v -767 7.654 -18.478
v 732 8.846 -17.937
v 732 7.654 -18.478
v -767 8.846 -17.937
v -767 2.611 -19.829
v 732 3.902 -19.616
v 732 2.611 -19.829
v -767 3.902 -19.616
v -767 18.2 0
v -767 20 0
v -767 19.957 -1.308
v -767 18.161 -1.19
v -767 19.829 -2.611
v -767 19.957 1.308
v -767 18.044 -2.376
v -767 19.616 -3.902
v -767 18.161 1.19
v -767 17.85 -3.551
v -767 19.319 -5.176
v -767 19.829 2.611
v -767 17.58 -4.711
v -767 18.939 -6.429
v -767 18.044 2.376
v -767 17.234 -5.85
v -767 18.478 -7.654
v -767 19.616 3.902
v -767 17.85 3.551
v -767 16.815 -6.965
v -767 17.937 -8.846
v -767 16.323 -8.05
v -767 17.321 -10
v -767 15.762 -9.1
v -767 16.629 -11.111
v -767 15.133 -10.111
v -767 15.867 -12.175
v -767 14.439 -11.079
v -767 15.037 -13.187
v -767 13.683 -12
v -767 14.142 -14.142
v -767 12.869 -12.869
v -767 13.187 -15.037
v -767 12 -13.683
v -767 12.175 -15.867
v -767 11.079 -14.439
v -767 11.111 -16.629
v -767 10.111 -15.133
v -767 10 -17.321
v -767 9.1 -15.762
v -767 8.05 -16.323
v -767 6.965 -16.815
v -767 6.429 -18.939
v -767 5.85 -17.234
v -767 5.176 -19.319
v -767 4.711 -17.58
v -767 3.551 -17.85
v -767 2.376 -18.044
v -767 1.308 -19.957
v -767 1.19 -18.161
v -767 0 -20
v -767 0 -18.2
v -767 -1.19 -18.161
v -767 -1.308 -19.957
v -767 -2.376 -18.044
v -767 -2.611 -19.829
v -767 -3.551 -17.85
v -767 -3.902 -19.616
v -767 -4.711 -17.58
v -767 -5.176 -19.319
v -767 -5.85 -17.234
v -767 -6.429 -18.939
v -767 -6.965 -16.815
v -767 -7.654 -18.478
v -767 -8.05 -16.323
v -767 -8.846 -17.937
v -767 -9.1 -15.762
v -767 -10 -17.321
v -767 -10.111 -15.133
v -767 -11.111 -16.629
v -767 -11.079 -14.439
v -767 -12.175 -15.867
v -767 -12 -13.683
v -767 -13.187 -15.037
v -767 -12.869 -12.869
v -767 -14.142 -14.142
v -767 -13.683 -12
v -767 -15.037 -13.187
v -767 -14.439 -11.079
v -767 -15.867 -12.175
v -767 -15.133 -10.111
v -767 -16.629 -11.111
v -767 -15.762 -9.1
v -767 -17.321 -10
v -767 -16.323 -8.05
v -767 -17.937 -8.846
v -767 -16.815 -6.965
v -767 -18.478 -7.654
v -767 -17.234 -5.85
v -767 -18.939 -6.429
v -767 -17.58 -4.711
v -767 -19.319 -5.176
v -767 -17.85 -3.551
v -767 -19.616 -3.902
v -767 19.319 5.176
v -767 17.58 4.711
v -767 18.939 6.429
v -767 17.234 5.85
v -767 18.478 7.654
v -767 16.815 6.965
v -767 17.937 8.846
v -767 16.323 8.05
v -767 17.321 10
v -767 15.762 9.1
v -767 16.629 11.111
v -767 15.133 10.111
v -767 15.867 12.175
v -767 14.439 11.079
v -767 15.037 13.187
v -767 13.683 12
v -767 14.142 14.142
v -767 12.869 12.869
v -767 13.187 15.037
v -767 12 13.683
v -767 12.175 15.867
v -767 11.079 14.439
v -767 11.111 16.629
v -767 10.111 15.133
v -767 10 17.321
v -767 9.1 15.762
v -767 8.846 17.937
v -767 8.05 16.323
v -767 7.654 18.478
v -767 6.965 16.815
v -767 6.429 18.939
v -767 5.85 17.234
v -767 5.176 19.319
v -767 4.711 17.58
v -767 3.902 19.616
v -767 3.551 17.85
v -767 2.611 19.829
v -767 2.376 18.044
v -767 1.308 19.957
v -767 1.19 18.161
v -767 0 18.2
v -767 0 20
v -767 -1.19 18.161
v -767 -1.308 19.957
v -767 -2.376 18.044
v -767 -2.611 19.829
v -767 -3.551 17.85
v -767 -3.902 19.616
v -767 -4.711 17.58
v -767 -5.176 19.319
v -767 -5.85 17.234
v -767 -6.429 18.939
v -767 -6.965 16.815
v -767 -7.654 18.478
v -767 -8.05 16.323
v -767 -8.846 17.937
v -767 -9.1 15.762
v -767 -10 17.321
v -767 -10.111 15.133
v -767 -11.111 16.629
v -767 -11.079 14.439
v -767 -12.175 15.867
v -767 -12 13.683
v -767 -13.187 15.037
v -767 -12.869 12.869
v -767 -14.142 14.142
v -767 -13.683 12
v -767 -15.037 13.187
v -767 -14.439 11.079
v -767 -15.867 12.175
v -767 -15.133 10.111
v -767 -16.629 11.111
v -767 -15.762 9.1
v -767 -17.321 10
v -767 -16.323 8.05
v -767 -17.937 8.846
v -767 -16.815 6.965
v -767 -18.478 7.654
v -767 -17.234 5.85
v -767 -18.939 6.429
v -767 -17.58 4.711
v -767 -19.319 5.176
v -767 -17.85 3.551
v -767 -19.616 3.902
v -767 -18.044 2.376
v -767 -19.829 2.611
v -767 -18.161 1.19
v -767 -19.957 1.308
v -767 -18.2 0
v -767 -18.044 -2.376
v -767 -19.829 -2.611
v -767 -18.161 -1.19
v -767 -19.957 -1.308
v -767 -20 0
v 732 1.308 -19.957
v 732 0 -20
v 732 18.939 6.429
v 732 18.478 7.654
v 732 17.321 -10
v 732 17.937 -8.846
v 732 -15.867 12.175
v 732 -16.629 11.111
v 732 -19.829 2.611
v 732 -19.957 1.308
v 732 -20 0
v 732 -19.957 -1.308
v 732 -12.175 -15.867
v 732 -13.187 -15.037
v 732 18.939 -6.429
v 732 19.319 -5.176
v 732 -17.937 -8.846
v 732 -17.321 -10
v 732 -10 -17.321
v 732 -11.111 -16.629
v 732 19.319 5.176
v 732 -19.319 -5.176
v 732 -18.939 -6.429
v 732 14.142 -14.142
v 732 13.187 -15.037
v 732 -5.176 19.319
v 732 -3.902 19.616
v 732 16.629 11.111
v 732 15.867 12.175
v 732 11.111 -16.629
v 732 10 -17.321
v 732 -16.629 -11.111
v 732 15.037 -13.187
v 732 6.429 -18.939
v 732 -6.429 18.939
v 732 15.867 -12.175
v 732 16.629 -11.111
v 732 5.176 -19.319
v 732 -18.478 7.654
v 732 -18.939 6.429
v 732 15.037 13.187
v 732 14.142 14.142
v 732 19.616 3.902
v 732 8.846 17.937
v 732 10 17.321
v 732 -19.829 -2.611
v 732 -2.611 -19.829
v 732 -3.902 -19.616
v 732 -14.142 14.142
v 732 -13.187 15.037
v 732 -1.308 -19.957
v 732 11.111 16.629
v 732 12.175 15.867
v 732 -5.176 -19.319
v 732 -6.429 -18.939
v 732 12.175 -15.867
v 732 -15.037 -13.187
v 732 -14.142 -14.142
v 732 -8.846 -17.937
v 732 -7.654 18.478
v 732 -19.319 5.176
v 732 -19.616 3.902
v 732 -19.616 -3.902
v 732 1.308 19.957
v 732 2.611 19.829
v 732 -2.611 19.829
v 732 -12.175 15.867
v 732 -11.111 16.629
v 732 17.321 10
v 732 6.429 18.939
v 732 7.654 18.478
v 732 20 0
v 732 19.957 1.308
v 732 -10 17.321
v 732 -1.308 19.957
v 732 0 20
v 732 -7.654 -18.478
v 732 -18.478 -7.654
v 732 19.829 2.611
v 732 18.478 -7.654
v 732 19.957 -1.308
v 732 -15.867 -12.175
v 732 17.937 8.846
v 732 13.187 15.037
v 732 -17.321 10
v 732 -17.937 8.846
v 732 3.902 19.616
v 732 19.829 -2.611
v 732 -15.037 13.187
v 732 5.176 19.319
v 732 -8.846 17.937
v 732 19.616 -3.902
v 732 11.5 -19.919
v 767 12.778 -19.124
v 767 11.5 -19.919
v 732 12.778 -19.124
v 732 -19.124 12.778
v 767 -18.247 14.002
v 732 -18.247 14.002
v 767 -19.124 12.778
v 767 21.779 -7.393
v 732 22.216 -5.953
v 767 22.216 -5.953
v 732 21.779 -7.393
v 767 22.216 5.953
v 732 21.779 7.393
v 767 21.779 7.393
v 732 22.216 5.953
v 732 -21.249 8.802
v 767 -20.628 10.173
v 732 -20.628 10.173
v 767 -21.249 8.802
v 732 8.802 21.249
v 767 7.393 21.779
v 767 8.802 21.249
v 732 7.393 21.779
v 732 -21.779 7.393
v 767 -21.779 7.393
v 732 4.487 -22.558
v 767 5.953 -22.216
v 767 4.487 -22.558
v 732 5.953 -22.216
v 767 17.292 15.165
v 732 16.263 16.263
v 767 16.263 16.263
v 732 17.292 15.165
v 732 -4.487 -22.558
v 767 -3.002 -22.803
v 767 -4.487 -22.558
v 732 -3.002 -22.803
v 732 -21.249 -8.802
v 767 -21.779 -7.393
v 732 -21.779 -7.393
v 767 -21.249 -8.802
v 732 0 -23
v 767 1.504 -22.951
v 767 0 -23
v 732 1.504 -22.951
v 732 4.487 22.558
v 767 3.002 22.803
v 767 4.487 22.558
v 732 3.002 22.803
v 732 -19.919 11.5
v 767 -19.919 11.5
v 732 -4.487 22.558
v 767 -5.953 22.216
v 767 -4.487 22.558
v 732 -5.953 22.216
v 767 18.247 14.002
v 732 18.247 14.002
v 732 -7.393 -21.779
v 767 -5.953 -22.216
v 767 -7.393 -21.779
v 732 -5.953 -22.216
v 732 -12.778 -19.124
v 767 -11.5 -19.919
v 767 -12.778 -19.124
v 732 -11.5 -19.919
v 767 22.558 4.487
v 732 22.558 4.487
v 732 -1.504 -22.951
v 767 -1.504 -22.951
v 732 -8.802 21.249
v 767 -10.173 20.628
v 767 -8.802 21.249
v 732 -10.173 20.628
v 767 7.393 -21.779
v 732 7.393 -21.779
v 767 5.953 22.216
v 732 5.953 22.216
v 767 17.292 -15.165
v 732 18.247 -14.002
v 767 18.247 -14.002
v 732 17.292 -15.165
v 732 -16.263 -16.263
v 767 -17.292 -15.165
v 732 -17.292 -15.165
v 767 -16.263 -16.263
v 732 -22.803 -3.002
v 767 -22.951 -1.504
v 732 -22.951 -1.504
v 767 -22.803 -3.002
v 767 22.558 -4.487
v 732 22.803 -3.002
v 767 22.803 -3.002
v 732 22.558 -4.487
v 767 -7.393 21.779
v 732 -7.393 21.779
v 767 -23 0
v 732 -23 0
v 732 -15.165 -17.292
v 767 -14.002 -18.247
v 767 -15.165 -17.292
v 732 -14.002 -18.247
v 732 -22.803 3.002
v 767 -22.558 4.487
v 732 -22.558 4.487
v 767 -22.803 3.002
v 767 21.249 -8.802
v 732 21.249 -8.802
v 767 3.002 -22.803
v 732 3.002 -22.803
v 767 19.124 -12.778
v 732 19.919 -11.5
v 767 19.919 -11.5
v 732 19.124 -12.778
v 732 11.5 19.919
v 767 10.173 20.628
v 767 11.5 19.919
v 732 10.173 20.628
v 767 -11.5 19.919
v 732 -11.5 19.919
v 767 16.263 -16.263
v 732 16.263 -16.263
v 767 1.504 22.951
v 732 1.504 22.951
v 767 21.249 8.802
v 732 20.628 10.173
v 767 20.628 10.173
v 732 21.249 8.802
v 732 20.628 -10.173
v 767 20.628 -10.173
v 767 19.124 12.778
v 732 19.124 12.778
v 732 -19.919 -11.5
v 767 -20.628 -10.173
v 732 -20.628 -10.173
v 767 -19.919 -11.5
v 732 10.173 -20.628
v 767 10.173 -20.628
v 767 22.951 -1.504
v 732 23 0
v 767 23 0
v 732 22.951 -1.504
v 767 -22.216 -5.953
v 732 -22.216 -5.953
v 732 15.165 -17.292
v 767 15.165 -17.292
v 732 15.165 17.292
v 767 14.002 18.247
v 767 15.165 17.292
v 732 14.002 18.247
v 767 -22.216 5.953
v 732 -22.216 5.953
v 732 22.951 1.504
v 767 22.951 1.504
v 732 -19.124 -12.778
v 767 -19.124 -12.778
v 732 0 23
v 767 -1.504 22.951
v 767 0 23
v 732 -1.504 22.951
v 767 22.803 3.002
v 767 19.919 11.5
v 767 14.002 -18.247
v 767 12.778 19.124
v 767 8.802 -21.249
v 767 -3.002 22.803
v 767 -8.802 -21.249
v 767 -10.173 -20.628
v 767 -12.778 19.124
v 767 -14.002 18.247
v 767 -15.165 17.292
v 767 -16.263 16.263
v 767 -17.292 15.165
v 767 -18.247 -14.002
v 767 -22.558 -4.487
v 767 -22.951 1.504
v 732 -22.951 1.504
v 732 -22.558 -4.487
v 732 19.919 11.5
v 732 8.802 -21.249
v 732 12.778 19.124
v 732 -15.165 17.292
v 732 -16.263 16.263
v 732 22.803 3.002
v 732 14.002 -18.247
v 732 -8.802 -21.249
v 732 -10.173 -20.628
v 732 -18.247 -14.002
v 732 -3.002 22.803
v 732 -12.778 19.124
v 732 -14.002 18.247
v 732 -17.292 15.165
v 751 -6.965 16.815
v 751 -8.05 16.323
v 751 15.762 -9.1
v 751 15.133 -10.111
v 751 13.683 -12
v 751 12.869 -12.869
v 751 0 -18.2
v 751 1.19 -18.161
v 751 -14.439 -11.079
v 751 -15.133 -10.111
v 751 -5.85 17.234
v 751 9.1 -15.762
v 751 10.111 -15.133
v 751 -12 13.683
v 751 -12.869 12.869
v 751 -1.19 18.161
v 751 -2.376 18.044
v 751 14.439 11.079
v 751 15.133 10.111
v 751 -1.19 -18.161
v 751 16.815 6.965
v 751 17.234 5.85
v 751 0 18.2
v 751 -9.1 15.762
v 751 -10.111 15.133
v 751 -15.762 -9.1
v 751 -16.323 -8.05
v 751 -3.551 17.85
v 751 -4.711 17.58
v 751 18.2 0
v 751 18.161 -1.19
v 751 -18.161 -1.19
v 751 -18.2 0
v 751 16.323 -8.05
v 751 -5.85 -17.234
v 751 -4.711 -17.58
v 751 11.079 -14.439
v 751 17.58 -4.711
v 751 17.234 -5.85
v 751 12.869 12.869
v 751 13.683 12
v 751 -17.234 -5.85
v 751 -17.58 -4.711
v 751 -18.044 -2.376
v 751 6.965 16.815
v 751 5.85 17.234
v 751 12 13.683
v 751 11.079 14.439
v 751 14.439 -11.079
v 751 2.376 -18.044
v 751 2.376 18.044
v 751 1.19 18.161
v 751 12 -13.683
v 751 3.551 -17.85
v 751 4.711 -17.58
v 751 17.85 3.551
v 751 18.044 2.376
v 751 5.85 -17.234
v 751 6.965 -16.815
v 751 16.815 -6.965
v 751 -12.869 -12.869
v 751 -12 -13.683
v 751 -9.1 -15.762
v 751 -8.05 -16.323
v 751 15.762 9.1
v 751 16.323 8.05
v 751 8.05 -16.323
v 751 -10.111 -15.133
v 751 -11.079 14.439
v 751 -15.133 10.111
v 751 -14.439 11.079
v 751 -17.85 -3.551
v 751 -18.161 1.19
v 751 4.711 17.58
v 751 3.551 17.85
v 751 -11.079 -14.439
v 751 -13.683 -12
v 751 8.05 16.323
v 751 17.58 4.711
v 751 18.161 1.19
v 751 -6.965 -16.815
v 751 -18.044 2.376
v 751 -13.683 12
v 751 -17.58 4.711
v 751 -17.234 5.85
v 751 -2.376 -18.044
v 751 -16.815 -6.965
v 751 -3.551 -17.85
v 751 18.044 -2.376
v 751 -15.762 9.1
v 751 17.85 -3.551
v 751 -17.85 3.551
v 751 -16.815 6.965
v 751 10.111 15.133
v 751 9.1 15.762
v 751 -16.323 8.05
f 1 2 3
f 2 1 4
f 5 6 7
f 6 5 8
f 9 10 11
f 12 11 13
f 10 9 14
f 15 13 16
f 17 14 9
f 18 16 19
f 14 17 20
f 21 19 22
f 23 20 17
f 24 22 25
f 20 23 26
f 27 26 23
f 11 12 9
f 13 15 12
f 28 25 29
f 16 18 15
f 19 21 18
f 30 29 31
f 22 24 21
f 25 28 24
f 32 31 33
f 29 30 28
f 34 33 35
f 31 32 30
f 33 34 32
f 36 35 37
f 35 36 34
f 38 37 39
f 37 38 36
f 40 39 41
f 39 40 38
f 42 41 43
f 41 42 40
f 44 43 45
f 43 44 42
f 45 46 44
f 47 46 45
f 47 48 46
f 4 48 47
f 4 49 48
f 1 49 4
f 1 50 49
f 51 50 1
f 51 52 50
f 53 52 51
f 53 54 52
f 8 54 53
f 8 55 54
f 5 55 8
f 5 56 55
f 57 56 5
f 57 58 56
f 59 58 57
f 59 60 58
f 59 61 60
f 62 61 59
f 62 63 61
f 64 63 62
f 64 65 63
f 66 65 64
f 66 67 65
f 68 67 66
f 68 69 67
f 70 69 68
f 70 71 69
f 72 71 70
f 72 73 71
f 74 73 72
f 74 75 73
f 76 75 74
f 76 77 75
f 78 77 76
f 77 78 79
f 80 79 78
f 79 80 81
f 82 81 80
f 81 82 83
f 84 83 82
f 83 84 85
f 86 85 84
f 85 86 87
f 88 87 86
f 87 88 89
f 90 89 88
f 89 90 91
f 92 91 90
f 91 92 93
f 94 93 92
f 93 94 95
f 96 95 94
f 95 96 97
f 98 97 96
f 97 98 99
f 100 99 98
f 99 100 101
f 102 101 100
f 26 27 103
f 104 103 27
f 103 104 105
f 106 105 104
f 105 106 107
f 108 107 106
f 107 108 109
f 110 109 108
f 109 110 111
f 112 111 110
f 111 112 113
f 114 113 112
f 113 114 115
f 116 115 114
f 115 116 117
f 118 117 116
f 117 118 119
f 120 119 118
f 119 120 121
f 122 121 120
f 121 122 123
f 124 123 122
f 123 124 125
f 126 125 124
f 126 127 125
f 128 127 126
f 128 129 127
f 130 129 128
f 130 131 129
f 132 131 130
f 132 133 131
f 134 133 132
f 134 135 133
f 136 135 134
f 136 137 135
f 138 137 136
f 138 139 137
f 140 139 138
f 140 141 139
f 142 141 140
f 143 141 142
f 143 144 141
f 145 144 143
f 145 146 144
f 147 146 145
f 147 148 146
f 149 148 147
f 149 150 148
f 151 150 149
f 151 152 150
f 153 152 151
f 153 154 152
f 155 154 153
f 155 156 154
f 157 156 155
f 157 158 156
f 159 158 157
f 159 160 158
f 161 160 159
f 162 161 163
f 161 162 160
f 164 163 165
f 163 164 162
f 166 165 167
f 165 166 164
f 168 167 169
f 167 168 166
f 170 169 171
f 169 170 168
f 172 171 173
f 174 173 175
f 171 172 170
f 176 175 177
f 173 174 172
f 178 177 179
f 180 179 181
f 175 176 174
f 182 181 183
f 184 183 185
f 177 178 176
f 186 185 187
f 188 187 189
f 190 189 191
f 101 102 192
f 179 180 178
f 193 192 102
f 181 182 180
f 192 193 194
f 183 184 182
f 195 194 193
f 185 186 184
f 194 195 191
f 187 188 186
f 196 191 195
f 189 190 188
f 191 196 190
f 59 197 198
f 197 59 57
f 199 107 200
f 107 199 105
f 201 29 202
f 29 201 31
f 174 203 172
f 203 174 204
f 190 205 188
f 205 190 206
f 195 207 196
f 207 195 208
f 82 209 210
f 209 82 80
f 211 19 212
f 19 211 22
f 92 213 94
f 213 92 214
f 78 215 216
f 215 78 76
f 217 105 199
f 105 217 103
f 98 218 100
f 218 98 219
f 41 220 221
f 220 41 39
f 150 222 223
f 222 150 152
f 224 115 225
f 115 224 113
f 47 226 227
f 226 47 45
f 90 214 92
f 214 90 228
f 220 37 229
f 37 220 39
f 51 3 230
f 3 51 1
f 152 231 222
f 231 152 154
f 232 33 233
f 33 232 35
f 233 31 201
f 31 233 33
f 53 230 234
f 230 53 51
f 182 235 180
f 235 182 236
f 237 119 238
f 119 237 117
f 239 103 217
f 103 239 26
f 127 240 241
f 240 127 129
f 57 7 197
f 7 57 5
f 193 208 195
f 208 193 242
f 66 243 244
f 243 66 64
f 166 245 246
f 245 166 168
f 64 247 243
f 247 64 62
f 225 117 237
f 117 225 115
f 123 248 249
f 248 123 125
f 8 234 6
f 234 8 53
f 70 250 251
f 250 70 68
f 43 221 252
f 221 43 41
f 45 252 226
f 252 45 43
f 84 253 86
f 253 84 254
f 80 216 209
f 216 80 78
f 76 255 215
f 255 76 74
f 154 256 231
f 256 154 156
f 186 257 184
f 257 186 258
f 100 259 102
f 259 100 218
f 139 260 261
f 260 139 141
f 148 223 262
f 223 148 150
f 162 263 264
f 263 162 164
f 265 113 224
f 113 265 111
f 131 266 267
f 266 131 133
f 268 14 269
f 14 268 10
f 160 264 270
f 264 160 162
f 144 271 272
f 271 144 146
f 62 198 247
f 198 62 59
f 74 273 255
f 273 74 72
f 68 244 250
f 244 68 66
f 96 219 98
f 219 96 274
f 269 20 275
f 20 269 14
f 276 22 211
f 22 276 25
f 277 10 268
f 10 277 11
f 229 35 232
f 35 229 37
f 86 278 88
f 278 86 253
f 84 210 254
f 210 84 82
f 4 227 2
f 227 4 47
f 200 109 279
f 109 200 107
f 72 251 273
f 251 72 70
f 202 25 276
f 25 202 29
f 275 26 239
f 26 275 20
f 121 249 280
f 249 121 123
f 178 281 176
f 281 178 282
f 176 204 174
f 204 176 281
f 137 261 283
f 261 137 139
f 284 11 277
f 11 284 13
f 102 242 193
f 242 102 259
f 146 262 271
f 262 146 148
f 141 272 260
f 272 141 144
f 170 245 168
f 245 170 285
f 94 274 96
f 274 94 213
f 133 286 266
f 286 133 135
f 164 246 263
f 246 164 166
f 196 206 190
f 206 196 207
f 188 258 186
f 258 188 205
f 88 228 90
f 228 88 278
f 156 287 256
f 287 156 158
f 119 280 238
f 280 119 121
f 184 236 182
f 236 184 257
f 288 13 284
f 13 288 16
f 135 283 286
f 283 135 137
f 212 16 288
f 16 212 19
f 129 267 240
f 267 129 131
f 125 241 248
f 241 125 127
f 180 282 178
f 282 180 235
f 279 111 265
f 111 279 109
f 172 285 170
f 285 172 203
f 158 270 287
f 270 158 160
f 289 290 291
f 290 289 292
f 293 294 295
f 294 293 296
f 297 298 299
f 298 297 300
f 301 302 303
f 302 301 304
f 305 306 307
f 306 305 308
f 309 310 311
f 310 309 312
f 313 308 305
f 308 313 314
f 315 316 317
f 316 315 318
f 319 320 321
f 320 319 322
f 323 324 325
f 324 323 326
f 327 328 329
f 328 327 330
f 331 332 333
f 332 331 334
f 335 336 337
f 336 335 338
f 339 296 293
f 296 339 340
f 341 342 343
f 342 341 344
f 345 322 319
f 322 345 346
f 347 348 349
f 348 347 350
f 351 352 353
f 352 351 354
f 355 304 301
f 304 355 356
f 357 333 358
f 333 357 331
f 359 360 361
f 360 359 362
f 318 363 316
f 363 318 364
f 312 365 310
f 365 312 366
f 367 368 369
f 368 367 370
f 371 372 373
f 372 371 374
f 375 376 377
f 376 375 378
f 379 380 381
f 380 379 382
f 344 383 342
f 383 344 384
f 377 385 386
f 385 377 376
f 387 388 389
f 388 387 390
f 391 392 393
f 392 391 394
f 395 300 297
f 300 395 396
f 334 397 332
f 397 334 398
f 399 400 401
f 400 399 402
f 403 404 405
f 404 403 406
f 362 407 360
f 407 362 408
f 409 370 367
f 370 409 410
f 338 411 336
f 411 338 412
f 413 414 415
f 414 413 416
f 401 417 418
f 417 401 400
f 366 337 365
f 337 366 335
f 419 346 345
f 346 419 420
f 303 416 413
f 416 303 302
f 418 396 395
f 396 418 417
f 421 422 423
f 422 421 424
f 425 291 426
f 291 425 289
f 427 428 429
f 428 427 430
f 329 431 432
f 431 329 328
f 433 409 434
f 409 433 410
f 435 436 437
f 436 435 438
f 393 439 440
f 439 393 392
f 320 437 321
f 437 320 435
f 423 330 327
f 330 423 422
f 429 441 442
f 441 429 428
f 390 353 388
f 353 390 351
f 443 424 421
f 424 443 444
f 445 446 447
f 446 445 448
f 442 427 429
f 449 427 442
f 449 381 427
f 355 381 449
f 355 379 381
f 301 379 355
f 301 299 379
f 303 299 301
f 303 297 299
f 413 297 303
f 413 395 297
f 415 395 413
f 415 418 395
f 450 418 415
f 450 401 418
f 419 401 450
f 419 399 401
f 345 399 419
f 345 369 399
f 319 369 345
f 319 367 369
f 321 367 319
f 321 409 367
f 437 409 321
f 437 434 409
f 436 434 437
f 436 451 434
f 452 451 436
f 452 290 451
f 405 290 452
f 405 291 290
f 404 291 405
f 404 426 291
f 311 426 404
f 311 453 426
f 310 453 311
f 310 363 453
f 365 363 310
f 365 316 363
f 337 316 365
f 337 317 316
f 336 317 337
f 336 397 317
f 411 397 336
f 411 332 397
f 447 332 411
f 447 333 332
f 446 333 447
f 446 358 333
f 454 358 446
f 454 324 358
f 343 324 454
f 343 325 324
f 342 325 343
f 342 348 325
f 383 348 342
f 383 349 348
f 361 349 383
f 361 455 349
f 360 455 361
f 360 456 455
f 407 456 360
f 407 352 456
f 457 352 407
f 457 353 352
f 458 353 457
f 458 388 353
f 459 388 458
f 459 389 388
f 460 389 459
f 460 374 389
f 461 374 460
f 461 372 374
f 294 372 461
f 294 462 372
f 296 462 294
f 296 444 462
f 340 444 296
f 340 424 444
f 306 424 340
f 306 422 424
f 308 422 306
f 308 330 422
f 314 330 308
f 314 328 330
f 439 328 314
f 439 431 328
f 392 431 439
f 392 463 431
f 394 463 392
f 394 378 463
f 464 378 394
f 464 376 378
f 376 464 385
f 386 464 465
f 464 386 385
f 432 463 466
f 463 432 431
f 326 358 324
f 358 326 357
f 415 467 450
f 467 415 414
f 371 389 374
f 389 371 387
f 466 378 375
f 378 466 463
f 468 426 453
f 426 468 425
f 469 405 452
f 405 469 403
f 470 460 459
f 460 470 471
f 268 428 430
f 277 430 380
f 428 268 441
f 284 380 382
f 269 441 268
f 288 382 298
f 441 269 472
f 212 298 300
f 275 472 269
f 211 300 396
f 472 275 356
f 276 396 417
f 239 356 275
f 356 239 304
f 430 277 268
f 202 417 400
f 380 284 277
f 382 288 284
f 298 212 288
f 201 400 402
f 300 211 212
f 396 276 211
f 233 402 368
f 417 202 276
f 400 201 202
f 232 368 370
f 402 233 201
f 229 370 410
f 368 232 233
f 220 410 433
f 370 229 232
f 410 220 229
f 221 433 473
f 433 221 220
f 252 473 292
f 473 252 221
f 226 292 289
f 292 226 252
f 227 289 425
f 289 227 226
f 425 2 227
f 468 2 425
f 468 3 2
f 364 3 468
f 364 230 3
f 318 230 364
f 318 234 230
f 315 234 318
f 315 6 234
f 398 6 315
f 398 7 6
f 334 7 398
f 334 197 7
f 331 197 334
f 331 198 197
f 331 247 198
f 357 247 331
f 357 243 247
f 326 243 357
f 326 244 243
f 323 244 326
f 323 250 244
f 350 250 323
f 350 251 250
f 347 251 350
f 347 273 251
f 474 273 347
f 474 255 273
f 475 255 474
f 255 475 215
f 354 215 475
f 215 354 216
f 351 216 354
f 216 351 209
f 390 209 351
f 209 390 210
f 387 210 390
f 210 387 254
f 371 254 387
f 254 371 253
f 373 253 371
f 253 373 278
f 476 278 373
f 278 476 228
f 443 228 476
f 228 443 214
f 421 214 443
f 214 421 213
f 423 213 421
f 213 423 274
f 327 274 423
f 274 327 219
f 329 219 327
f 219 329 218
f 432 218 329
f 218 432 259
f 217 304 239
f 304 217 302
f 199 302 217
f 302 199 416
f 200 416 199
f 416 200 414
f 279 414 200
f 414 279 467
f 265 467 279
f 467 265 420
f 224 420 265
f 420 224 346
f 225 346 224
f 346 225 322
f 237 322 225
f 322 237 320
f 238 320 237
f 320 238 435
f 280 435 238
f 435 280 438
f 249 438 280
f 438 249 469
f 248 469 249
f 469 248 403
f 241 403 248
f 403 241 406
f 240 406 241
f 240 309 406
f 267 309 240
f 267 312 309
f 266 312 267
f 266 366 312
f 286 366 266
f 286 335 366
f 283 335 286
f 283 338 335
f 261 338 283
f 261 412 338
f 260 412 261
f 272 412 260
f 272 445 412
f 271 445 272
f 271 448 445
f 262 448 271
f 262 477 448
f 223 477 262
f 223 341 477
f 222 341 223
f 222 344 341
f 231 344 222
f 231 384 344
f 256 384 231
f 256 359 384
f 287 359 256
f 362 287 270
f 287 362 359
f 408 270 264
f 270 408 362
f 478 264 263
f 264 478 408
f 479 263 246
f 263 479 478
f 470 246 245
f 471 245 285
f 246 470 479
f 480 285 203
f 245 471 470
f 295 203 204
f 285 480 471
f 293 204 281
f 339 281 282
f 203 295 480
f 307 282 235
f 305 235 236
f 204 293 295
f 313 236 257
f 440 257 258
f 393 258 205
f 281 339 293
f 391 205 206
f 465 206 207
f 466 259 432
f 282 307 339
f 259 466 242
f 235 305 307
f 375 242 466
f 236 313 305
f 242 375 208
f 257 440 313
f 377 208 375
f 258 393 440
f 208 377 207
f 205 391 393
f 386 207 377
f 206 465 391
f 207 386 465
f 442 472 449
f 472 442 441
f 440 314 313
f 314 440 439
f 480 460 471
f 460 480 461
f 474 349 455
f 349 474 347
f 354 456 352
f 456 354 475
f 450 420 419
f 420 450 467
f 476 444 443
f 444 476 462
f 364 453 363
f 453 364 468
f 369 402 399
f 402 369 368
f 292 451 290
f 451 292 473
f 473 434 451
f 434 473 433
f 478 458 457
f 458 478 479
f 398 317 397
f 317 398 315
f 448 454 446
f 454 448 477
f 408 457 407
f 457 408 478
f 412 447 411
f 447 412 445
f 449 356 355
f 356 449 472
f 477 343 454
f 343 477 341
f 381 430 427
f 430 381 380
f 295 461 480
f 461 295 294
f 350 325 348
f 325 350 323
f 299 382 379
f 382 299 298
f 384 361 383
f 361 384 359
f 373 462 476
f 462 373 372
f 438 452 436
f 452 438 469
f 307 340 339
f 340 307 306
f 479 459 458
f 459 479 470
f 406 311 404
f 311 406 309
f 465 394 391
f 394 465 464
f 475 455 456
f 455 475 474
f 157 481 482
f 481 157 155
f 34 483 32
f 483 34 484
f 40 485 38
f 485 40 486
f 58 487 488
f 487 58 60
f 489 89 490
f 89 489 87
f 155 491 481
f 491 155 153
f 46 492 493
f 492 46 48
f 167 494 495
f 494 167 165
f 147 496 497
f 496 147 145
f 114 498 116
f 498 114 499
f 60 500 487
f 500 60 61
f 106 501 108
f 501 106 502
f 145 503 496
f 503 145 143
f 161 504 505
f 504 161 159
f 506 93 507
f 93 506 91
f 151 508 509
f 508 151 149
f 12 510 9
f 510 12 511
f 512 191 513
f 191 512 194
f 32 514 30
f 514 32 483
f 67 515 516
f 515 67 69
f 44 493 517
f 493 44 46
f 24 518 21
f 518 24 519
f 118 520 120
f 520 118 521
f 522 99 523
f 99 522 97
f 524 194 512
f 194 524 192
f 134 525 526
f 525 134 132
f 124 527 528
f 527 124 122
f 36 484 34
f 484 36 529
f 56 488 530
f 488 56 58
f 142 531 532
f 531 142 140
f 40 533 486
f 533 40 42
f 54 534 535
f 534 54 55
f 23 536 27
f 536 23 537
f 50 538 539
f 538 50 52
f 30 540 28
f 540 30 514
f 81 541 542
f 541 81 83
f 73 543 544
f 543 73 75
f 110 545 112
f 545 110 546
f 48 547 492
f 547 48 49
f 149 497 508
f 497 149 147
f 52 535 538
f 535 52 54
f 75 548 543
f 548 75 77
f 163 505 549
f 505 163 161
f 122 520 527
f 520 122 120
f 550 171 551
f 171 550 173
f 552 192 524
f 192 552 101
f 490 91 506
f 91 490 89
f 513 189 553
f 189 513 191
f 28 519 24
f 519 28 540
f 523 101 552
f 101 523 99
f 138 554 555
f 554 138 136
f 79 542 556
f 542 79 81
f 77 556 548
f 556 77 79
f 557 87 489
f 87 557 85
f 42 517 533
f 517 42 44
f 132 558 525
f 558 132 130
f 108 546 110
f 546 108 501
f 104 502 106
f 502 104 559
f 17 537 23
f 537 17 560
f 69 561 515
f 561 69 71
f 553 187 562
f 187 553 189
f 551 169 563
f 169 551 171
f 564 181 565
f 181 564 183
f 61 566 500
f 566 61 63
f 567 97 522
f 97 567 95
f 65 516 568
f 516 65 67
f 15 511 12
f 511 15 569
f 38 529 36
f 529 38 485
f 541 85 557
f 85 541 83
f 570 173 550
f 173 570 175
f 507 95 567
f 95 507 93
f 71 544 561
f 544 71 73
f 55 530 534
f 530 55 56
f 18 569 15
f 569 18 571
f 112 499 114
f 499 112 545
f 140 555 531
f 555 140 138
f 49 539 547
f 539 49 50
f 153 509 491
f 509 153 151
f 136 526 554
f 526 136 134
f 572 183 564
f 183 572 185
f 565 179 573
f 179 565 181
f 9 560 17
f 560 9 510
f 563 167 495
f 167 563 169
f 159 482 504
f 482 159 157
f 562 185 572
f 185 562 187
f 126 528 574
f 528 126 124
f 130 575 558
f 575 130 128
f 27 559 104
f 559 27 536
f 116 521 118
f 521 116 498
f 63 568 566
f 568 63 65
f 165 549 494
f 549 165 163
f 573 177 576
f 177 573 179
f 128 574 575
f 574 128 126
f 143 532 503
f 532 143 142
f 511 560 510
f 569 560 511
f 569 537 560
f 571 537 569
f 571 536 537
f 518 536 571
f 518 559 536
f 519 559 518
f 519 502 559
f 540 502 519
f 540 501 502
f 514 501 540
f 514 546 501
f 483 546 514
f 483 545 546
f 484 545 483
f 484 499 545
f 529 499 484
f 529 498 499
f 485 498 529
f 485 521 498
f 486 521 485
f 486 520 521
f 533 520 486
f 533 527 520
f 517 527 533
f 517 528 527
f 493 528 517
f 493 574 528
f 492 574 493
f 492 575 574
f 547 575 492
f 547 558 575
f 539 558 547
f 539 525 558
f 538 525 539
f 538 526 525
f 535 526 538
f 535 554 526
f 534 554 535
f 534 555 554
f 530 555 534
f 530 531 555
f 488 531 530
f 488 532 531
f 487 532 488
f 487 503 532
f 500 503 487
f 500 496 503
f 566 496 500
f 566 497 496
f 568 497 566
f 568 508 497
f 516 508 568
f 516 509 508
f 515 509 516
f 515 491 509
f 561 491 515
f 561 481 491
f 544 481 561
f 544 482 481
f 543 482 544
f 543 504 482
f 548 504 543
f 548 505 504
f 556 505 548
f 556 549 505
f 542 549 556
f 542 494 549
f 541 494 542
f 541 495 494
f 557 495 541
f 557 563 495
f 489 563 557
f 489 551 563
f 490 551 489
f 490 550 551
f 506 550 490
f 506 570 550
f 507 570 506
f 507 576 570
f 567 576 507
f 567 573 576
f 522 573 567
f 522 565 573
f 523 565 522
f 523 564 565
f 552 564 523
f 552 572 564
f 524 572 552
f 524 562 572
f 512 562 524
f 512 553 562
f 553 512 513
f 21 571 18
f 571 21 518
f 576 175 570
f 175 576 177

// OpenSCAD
// Parameters
length_mm = 1500; //[750:3000:10]
ht40_outer_diameter = 40; //[30:80:1]
ht40_wall_thickness = 1.8; //[1:4:0.1]
end_fitting_length = 35; //[15:80:1]
end_fitting_radial_add = 3; //[1:10:0.5]
overlap_mm = 1; //[0.5:2:0.1]

$fn = 96;

// HT Pipe Segment - oriented along X so orthographic front/back/left/right show full length
module ht_pipe() {
    outer_r = ht40_outer_diameter/2;
    inner_r = outer_r - ht40_wall_thickness;

    // Total outer length includes the socket/fitting on one end
    total_outer_len = length_mm + end_fitting_length - overlap_mm;

    // Place the whole part centered in X for correct framing in all views
    x_min = -length_mm/2;
    x_max =  length_mm/2 + end_fitting_length - overlap_mm;
    x_center = (x_min + x_max)/2;

    translate([-x_center, 0, 0])
    color([0.85, 0.85, 0.8])
    difference() {
        // ONE connected solid outer shell (main pipe + end fitting) via union with overlap
        union() {
            // Main pipe outer
            translate([0, 0, 0])
                rotate([0, 90, 0])
                    cylinder(h=length_mm, r=outer_r, center=true);

            // End fitting outer (socket) connected to +X end of main pipe
            translate([length_mm/2 + end_fitting_length/2 - overlap_mm, 0, 0])
                rotate([0, 90, 0])
                    cylinder(h=end_fitting_length, r=outer_r + end_fitting_radial_add, center=true);
        }

        // Inner void: continuous through entire length (including fitting)
        // Slightly longer to guarantee clean subtraction at ends
        rotate([0, 90, 0])
            cylinder(h=total_outer_len + 2*overlap_mm, r=inner_r, center=true);
    }
}

// Assembly
module assembly() {
    ht_pipe();
}

assembly();
